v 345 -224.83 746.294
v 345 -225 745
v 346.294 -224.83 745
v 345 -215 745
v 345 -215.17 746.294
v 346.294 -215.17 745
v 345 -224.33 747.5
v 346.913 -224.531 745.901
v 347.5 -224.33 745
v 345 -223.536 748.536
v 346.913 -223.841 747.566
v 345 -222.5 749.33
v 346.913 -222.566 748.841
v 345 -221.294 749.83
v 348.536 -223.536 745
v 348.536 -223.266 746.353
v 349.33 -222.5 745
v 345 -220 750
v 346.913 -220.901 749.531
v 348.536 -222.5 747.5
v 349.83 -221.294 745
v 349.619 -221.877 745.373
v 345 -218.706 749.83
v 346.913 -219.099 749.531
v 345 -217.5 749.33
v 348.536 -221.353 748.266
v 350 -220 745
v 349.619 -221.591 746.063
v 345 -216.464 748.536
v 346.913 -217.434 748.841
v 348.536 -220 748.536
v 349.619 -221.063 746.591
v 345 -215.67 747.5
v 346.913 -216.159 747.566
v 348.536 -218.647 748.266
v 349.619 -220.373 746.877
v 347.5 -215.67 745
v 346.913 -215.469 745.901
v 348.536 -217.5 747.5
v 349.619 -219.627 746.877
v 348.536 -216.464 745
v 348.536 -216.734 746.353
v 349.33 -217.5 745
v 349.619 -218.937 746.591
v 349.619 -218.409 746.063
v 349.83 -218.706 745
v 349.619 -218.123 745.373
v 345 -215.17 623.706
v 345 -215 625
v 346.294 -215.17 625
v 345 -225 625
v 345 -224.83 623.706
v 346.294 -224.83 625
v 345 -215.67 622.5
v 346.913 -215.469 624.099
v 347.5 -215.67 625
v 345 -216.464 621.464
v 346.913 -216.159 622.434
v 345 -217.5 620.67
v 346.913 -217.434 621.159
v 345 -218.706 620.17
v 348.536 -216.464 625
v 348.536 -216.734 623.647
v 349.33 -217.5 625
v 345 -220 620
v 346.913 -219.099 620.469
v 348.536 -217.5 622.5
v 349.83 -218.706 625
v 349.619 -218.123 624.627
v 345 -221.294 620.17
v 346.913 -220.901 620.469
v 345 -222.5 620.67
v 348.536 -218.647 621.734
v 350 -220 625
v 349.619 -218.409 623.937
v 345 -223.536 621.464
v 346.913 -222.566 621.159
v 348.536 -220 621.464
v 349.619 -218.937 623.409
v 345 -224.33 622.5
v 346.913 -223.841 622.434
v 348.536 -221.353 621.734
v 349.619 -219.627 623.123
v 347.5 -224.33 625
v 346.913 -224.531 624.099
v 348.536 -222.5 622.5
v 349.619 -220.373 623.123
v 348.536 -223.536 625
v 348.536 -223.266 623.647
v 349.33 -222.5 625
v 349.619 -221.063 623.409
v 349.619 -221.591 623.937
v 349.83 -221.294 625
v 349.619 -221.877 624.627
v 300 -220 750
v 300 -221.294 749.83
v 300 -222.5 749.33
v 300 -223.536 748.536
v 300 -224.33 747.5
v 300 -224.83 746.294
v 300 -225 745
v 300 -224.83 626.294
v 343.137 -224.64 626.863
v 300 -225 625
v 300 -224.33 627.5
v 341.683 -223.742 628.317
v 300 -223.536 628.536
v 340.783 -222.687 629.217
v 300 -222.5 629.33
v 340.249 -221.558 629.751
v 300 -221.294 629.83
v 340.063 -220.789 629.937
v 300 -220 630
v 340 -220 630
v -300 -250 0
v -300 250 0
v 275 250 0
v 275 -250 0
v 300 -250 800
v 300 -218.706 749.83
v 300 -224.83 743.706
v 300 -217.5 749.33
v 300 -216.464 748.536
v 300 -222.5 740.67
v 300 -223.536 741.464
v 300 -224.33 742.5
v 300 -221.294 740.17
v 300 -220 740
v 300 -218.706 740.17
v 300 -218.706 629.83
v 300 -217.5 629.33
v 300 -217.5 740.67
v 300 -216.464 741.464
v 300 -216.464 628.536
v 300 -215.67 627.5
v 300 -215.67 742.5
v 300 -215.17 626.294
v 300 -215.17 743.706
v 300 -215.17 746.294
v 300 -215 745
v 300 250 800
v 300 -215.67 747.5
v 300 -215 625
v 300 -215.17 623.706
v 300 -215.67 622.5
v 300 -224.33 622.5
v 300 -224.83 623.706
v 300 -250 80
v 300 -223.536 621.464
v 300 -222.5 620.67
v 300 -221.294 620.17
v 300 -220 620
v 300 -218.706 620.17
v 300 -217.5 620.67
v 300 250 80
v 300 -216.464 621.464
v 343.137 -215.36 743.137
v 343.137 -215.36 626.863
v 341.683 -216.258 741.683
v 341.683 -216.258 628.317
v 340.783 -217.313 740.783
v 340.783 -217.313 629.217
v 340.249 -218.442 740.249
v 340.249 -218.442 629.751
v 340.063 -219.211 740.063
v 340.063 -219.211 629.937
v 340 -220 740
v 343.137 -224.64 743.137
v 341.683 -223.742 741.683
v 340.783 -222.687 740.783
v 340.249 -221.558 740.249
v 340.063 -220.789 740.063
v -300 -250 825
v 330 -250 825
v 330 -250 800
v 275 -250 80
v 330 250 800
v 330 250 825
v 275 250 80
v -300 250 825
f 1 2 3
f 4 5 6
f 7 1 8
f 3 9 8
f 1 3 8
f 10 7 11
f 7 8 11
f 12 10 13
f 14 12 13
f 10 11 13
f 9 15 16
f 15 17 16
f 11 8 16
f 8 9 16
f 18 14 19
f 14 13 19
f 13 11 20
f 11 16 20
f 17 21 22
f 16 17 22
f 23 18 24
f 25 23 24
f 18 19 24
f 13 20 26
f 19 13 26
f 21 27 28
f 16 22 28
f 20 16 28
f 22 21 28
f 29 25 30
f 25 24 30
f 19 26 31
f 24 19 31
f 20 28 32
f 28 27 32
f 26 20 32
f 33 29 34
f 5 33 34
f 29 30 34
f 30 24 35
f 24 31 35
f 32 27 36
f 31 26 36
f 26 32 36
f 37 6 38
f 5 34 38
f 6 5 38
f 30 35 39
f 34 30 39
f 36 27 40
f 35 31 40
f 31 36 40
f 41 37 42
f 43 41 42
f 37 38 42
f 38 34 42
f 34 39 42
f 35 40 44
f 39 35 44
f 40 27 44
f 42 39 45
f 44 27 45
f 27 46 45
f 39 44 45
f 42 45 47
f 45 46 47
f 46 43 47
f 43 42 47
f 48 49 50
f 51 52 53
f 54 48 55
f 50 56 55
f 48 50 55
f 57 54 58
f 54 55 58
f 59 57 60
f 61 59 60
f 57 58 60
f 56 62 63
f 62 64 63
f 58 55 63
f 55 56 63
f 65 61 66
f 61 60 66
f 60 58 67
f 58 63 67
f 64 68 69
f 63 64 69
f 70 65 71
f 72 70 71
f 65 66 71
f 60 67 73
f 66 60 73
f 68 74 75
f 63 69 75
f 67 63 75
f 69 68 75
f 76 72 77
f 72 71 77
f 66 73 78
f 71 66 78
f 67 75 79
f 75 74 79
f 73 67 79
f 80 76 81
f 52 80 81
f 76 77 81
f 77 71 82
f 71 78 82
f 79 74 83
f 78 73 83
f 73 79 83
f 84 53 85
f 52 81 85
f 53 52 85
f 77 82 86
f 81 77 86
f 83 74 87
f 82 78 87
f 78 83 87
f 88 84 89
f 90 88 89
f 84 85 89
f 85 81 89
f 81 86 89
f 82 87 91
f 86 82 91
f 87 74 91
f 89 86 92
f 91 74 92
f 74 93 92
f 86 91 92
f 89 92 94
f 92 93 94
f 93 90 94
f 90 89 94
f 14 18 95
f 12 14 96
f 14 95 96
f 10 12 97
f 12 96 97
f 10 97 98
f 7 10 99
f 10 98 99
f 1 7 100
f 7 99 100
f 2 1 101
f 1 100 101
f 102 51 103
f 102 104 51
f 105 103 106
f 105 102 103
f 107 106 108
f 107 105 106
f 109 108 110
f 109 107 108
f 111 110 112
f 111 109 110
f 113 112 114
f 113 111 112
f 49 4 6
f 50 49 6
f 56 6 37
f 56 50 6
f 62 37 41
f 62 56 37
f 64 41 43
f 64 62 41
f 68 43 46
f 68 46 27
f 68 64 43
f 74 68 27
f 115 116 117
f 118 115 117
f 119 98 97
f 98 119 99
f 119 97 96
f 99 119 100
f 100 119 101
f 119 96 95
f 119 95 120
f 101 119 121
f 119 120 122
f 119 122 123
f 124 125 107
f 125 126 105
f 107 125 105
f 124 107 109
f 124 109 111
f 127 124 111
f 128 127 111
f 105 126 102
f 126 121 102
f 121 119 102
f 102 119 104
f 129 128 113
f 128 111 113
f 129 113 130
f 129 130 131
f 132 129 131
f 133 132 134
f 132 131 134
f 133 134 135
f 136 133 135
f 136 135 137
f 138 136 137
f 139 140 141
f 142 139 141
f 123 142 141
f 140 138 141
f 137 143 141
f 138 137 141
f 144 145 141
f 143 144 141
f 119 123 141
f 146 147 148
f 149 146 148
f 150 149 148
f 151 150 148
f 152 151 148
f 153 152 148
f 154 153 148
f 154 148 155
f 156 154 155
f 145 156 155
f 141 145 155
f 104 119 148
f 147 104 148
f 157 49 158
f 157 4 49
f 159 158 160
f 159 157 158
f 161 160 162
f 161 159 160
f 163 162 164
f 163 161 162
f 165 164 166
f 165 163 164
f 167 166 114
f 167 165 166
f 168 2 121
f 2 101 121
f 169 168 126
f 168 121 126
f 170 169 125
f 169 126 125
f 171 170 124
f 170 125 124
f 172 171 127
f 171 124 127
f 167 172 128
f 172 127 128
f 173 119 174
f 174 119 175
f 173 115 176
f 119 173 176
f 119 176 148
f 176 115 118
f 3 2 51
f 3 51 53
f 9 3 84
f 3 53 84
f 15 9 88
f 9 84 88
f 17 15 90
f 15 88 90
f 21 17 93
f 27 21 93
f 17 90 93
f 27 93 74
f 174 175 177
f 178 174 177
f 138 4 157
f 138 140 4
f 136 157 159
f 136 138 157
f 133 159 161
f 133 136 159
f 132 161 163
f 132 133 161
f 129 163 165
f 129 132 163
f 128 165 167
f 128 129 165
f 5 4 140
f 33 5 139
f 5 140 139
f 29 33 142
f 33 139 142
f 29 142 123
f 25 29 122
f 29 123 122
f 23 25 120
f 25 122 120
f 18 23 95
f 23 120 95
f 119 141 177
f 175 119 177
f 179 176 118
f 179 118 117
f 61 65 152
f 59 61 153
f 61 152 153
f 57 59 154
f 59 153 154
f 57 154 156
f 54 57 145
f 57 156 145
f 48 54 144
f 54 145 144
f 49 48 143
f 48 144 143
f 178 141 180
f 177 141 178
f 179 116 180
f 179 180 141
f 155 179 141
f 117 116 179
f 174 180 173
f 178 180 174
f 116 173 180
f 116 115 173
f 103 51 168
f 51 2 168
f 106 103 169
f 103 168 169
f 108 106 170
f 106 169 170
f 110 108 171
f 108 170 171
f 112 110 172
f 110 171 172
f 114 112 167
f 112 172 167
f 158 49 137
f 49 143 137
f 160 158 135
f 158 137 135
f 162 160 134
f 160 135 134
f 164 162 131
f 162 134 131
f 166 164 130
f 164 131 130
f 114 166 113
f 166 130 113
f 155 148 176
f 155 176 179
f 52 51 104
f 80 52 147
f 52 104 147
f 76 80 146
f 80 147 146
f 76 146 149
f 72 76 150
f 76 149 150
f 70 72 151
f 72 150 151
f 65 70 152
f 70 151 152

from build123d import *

# Parameters (mm, degrees)
F0_W        = 600
F0_H        = 500
F1_DEPTH    = 800
F2_W        = 500
F2_H        = 80
F3_DEPTH    = 25
F5_DEPTH    = 50
F6_T1_DEPTH = 120
F6_T4_ANGLE = 180
F6_T6_ANGLE = 180
F7_W        = 40
F7_H        = 110
F8_DEPTH    = 25
F9_R        = 4.99999
F10_W       = 630
F10_H       = 500
F11_DEPTH   = 25


# Not quite as in the source:
# - a fillet or chamfer that OpenCascade refuses, or shapes differently, is made with other operations: its cross-section is extruded or revolved along the edge and cut away or added
# - a fillet or chamfer is up to 0.001 mm smaller than in the source, because OpenCascade refuses the exact size


with BuildPart() as f1:
    # F0 (on Top) → F1 (new body)
    with BuildSketch(Plane.XY):
        Rectangle(F0_W, F0_H)
    extrude(amount=F1_DEPTH)

    # F2 (on face) → F3 (cut)
    with BuildSketch(Plane.YZ.offset(300)):
        with Locations((0, 40)):
            Rectangle(F2_W, F2_H)
    extrude(amount=-F3_DEPTH, mode=Mode.SUBTRACT)

    # F4 (on face) → F5 (join)
    with BuildSketch(Plane.YZ.offset(300)):
        with BuildLine():
            ThreePointArc((-220, 750), (-223.5355339059, 748.5355339059), (-225, 745))
            Line((-225, 745), (-225, 625))
            ThreePointArc((-225, 625), (-223.5355339059, 621.4644660941), (-220, 620))
            ThreePointArc((-220, 620), (-216.4644660941, 621.4644660941), (-215, 625))
            Line((-215, 625), (-215, 745))
            ThreePointArc((-215, 745), (-216.4644660941, 748.5355339059), (-220, 750))
        make_face()
    extrude(amount=F5_DEPTH)

    # F6: fillet of radius 5 on 4 edges, made by hand

    # F6_s2 → F6_t1 (cut)
    with BuildSketch(Plane.XY.offset(625)):
        with BuildLine():
            ThreePointArc((345, -225), (348.5355339059, -223.5355339059), (350, -220))
            Line((350, -220), (350.1, -220))
            Line((350.1, -220), (350.1, -225.1))
            Line((350.1, -225.1), (345, -225.1))
            Line((345, -225.1), (345, -225))
        make_face()
        with BuildLine():
            ThreePointArc((345, -215), (348.5355339059, -216.4644660941), (350, -220))
            Line((350, -220), (350.1, -220))
            Line((350.1, -220), (350.1, -214.9))
            Line((350.1, -214.9), (345, -214.9))
            Line((345, -214.9), (345, -215))
        make_face()
    extrude(amount=F6_T1_DEPTH, mode=Mode.SUBTRACT)

    # F6_s3 → F6_t4 (revolve, cut)
    with BuildSketch(Plane.XY.offset(745)):
        with BuildLine():
            ThreePointArc((345, -225), (348.5355339059, -223.5355339059), (350, -220))
            Line((350, -220), (350.1, -220))
            Line((350.1, -220), (350.1, -225.1))
            Line((350.1, -225.1), (345, -225.1))
            Line((345, -225.1), (345, -225))
        make_face()
    revolve(axis=Axis((350, -220, 745), (-1, 0, 0)), revolution_arc=F6_T4_ANGLE, mode=Mode.SUBTRACT)

    # F6_s5 → F6_t6 (revolve, cut)
    with BuildSketch(Plane.XY.offset(625)):
        with BuildLine():
            ThreePointArc((345, -215), (348.5355339059, -216.4644660941), (350, -220))
            Line((350, -220), (350.1, -220))
            Line((350.1, -220), (350.1, -214.9))
            Line((350.1, -214.9), (345, -214.9))
            Line((345, -214.9), (345, -215))
        make_face()
    revolve(axis=Axis((350, -220, 625), (-1, 0, 0)), revolution_arc=F6_T6_ANGLE, mode=Mode.SUBTRACT)

    # F7 (on face) → F8 (cut)
    with BuildSketch(Plane(origin=(0, -215, 0), x_dir=(-1, 0, 0), z_dir=(0, 1, 0))):
        with Locations((-320, 685)):
            Rectangle(F7_W, F7_H)
    extrude(amount=-F8_DEPTH, mode=Mode.SUBTRACT)

    # F9 (radius 5 in the source; OpenCascade refuses exactly that, so slightly less here)
    f9_edges = [f1.edges().sort_by_distance(p)[0] for p in [
        (320, -215, 740),
        (340, -215, 685),
        (320, -215, 630),
        (320, -225, 740),
        (340, -225, 685),
        (320, -225, 630),
    ]]
    fillet(f9_edges, radius=F9_R)

    # F10 (on face) → F11 (join)
    with BuildSketch(Plane.XY.offset(800)):
        with Locations((15, 0)):
            Rectangle(F10_W, F10_H)
    extrude(amount=F11_DEPTH)


solid = f1.part
